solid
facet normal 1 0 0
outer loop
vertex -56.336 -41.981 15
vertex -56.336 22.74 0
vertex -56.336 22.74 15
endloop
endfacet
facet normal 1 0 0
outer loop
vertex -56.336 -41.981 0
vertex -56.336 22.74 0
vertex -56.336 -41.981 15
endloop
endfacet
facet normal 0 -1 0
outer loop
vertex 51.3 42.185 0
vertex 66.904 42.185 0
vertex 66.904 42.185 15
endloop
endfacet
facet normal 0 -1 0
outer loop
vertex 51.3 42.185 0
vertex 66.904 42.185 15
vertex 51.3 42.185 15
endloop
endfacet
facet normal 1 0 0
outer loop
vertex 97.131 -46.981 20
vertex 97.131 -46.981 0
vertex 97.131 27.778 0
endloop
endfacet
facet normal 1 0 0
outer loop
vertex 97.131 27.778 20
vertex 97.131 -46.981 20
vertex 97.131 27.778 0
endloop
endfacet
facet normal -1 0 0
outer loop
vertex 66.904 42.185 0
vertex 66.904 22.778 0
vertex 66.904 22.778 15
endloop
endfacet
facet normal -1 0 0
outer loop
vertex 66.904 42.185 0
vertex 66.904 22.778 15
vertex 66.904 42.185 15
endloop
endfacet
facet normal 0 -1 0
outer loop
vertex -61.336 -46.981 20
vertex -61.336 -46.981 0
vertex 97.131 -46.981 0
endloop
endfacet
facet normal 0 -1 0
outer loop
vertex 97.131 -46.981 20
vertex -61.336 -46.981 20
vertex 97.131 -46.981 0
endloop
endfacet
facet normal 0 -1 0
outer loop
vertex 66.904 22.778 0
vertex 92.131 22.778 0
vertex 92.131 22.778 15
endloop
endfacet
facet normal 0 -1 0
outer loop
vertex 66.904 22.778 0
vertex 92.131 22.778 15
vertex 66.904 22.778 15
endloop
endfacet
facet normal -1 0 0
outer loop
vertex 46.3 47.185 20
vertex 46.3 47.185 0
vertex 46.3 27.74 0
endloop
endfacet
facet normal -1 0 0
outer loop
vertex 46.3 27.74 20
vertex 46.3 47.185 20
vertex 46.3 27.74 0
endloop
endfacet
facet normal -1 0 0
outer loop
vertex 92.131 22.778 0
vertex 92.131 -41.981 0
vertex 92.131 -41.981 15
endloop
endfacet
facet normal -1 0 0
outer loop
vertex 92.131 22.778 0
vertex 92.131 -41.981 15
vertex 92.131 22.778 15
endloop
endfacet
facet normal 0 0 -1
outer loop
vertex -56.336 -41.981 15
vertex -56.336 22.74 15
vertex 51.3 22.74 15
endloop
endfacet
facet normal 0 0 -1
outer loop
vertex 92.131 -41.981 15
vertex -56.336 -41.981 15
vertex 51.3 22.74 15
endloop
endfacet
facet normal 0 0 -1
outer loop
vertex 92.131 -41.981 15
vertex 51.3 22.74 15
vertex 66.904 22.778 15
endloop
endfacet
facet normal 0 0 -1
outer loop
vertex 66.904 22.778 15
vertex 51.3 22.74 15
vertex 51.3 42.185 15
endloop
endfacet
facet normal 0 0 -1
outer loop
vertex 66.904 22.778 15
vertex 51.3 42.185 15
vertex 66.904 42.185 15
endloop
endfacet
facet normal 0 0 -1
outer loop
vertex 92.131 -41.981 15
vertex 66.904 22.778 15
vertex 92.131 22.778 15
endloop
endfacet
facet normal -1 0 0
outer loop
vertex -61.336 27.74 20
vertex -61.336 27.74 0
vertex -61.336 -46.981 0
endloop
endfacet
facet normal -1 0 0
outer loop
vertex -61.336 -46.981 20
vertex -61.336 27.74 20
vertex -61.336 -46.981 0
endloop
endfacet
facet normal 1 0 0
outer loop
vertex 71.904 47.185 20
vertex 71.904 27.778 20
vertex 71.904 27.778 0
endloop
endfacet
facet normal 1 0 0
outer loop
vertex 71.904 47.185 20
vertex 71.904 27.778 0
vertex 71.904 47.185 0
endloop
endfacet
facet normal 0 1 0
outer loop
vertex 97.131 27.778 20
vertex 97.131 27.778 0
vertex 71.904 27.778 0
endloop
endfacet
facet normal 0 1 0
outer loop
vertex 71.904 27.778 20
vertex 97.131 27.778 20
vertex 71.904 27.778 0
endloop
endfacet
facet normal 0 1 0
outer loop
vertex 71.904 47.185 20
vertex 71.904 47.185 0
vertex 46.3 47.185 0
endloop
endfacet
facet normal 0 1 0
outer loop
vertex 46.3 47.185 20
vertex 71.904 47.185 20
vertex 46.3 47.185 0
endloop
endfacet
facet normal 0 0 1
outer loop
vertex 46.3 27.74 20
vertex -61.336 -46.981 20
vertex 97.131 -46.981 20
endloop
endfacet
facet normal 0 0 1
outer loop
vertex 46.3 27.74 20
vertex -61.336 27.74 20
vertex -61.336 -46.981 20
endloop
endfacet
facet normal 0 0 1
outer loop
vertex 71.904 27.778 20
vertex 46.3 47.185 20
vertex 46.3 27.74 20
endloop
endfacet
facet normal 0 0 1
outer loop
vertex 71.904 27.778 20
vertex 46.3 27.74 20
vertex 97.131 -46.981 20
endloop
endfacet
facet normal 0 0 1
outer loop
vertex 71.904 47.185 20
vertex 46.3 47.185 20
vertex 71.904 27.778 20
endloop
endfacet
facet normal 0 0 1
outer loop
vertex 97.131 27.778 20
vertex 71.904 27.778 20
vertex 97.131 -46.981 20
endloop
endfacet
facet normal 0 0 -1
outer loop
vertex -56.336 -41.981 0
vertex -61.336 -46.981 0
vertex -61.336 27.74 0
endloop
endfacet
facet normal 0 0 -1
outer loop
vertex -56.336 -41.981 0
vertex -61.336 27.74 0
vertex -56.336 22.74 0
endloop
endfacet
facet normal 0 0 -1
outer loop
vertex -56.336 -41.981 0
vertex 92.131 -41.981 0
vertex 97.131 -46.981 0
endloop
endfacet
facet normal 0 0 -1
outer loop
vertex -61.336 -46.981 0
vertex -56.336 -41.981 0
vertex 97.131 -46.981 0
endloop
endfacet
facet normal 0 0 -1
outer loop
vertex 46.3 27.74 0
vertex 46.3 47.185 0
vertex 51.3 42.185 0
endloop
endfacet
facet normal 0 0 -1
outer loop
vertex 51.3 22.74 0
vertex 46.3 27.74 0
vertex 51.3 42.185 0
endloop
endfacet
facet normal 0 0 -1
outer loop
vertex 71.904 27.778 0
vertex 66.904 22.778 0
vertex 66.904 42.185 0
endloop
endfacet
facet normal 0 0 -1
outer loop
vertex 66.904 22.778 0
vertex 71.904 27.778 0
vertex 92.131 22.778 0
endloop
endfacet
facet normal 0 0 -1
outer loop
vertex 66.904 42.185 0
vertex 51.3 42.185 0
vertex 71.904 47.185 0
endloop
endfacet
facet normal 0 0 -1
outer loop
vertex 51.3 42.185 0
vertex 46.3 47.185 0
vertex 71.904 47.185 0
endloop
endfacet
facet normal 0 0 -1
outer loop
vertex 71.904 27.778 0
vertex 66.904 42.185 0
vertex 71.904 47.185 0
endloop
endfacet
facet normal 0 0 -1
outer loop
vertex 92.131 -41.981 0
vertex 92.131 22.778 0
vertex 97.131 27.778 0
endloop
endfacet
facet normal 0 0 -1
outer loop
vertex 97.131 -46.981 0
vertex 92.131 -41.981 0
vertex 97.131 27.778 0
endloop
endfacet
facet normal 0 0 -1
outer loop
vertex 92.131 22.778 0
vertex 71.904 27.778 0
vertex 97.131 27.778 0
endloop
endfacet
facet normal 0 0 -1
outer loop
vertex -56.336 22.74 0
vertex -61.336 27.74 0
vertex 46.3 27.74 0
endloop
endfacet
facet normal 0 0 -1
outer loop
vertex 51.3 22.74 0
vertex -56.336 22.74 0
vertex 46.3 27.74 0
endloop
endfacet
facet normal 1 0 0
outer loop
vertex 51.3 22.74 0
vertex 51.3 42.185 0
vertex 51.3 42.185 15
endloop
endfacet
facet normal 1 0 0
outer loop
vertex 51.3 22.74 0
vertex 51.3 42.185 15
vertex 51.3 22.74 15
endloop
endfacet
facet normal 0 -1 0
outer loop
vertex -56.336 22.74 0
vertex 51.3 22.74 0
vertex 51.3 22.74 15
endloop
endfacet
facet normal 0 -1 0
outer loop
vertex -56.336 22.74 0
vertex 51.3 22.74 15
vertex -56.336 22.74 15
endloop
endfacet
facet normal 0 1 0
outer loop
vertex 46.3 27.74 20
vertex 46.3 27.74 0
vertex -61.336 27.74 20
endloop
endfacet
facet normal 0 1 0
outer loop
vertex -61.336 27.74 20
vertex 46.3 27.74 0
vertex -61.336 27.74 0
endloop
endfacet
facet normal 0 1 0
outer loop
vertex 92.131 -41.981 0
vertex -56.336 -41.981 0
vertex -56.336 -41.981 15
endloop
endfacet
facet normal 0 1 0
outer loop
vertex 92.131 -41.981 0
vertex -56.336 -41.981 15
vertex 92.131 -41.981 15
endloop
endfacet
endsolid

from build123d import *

# Parameters (mm, degrees)
BOSS_EXTRUDE1_DEPTH = 20
SHELL1_T            = -5


with BuildPart() as part:
    # Sketch2 → Boss-Extrude1 (new body)
    with BuildSketch(Plane.XY):
        Polygon((-61.336329504, -46.981018343), (97.131391098, -46.981018343), (97.131391098, 27.778459258), (71.904316974, 27.778459258), (71.904316974, 47.185045125), (46.299911218, 47.185045125), (46.299911218, 27.739957348), (-61.336329504, 27.739957348), align=None)
    extrude(amount=BOSS_EXTRUDE1_DEPTH)

    # Shell1
    shell1_openings = [part.faces().sort_by_distance(p)[0] for p in [
        (19.565287633, -7.717892988, 0),
    ]]
    offset(amount=SHELL1_T, openings=shell1_openings, kind=Kind.INTERSECTION)


solid = part.part
